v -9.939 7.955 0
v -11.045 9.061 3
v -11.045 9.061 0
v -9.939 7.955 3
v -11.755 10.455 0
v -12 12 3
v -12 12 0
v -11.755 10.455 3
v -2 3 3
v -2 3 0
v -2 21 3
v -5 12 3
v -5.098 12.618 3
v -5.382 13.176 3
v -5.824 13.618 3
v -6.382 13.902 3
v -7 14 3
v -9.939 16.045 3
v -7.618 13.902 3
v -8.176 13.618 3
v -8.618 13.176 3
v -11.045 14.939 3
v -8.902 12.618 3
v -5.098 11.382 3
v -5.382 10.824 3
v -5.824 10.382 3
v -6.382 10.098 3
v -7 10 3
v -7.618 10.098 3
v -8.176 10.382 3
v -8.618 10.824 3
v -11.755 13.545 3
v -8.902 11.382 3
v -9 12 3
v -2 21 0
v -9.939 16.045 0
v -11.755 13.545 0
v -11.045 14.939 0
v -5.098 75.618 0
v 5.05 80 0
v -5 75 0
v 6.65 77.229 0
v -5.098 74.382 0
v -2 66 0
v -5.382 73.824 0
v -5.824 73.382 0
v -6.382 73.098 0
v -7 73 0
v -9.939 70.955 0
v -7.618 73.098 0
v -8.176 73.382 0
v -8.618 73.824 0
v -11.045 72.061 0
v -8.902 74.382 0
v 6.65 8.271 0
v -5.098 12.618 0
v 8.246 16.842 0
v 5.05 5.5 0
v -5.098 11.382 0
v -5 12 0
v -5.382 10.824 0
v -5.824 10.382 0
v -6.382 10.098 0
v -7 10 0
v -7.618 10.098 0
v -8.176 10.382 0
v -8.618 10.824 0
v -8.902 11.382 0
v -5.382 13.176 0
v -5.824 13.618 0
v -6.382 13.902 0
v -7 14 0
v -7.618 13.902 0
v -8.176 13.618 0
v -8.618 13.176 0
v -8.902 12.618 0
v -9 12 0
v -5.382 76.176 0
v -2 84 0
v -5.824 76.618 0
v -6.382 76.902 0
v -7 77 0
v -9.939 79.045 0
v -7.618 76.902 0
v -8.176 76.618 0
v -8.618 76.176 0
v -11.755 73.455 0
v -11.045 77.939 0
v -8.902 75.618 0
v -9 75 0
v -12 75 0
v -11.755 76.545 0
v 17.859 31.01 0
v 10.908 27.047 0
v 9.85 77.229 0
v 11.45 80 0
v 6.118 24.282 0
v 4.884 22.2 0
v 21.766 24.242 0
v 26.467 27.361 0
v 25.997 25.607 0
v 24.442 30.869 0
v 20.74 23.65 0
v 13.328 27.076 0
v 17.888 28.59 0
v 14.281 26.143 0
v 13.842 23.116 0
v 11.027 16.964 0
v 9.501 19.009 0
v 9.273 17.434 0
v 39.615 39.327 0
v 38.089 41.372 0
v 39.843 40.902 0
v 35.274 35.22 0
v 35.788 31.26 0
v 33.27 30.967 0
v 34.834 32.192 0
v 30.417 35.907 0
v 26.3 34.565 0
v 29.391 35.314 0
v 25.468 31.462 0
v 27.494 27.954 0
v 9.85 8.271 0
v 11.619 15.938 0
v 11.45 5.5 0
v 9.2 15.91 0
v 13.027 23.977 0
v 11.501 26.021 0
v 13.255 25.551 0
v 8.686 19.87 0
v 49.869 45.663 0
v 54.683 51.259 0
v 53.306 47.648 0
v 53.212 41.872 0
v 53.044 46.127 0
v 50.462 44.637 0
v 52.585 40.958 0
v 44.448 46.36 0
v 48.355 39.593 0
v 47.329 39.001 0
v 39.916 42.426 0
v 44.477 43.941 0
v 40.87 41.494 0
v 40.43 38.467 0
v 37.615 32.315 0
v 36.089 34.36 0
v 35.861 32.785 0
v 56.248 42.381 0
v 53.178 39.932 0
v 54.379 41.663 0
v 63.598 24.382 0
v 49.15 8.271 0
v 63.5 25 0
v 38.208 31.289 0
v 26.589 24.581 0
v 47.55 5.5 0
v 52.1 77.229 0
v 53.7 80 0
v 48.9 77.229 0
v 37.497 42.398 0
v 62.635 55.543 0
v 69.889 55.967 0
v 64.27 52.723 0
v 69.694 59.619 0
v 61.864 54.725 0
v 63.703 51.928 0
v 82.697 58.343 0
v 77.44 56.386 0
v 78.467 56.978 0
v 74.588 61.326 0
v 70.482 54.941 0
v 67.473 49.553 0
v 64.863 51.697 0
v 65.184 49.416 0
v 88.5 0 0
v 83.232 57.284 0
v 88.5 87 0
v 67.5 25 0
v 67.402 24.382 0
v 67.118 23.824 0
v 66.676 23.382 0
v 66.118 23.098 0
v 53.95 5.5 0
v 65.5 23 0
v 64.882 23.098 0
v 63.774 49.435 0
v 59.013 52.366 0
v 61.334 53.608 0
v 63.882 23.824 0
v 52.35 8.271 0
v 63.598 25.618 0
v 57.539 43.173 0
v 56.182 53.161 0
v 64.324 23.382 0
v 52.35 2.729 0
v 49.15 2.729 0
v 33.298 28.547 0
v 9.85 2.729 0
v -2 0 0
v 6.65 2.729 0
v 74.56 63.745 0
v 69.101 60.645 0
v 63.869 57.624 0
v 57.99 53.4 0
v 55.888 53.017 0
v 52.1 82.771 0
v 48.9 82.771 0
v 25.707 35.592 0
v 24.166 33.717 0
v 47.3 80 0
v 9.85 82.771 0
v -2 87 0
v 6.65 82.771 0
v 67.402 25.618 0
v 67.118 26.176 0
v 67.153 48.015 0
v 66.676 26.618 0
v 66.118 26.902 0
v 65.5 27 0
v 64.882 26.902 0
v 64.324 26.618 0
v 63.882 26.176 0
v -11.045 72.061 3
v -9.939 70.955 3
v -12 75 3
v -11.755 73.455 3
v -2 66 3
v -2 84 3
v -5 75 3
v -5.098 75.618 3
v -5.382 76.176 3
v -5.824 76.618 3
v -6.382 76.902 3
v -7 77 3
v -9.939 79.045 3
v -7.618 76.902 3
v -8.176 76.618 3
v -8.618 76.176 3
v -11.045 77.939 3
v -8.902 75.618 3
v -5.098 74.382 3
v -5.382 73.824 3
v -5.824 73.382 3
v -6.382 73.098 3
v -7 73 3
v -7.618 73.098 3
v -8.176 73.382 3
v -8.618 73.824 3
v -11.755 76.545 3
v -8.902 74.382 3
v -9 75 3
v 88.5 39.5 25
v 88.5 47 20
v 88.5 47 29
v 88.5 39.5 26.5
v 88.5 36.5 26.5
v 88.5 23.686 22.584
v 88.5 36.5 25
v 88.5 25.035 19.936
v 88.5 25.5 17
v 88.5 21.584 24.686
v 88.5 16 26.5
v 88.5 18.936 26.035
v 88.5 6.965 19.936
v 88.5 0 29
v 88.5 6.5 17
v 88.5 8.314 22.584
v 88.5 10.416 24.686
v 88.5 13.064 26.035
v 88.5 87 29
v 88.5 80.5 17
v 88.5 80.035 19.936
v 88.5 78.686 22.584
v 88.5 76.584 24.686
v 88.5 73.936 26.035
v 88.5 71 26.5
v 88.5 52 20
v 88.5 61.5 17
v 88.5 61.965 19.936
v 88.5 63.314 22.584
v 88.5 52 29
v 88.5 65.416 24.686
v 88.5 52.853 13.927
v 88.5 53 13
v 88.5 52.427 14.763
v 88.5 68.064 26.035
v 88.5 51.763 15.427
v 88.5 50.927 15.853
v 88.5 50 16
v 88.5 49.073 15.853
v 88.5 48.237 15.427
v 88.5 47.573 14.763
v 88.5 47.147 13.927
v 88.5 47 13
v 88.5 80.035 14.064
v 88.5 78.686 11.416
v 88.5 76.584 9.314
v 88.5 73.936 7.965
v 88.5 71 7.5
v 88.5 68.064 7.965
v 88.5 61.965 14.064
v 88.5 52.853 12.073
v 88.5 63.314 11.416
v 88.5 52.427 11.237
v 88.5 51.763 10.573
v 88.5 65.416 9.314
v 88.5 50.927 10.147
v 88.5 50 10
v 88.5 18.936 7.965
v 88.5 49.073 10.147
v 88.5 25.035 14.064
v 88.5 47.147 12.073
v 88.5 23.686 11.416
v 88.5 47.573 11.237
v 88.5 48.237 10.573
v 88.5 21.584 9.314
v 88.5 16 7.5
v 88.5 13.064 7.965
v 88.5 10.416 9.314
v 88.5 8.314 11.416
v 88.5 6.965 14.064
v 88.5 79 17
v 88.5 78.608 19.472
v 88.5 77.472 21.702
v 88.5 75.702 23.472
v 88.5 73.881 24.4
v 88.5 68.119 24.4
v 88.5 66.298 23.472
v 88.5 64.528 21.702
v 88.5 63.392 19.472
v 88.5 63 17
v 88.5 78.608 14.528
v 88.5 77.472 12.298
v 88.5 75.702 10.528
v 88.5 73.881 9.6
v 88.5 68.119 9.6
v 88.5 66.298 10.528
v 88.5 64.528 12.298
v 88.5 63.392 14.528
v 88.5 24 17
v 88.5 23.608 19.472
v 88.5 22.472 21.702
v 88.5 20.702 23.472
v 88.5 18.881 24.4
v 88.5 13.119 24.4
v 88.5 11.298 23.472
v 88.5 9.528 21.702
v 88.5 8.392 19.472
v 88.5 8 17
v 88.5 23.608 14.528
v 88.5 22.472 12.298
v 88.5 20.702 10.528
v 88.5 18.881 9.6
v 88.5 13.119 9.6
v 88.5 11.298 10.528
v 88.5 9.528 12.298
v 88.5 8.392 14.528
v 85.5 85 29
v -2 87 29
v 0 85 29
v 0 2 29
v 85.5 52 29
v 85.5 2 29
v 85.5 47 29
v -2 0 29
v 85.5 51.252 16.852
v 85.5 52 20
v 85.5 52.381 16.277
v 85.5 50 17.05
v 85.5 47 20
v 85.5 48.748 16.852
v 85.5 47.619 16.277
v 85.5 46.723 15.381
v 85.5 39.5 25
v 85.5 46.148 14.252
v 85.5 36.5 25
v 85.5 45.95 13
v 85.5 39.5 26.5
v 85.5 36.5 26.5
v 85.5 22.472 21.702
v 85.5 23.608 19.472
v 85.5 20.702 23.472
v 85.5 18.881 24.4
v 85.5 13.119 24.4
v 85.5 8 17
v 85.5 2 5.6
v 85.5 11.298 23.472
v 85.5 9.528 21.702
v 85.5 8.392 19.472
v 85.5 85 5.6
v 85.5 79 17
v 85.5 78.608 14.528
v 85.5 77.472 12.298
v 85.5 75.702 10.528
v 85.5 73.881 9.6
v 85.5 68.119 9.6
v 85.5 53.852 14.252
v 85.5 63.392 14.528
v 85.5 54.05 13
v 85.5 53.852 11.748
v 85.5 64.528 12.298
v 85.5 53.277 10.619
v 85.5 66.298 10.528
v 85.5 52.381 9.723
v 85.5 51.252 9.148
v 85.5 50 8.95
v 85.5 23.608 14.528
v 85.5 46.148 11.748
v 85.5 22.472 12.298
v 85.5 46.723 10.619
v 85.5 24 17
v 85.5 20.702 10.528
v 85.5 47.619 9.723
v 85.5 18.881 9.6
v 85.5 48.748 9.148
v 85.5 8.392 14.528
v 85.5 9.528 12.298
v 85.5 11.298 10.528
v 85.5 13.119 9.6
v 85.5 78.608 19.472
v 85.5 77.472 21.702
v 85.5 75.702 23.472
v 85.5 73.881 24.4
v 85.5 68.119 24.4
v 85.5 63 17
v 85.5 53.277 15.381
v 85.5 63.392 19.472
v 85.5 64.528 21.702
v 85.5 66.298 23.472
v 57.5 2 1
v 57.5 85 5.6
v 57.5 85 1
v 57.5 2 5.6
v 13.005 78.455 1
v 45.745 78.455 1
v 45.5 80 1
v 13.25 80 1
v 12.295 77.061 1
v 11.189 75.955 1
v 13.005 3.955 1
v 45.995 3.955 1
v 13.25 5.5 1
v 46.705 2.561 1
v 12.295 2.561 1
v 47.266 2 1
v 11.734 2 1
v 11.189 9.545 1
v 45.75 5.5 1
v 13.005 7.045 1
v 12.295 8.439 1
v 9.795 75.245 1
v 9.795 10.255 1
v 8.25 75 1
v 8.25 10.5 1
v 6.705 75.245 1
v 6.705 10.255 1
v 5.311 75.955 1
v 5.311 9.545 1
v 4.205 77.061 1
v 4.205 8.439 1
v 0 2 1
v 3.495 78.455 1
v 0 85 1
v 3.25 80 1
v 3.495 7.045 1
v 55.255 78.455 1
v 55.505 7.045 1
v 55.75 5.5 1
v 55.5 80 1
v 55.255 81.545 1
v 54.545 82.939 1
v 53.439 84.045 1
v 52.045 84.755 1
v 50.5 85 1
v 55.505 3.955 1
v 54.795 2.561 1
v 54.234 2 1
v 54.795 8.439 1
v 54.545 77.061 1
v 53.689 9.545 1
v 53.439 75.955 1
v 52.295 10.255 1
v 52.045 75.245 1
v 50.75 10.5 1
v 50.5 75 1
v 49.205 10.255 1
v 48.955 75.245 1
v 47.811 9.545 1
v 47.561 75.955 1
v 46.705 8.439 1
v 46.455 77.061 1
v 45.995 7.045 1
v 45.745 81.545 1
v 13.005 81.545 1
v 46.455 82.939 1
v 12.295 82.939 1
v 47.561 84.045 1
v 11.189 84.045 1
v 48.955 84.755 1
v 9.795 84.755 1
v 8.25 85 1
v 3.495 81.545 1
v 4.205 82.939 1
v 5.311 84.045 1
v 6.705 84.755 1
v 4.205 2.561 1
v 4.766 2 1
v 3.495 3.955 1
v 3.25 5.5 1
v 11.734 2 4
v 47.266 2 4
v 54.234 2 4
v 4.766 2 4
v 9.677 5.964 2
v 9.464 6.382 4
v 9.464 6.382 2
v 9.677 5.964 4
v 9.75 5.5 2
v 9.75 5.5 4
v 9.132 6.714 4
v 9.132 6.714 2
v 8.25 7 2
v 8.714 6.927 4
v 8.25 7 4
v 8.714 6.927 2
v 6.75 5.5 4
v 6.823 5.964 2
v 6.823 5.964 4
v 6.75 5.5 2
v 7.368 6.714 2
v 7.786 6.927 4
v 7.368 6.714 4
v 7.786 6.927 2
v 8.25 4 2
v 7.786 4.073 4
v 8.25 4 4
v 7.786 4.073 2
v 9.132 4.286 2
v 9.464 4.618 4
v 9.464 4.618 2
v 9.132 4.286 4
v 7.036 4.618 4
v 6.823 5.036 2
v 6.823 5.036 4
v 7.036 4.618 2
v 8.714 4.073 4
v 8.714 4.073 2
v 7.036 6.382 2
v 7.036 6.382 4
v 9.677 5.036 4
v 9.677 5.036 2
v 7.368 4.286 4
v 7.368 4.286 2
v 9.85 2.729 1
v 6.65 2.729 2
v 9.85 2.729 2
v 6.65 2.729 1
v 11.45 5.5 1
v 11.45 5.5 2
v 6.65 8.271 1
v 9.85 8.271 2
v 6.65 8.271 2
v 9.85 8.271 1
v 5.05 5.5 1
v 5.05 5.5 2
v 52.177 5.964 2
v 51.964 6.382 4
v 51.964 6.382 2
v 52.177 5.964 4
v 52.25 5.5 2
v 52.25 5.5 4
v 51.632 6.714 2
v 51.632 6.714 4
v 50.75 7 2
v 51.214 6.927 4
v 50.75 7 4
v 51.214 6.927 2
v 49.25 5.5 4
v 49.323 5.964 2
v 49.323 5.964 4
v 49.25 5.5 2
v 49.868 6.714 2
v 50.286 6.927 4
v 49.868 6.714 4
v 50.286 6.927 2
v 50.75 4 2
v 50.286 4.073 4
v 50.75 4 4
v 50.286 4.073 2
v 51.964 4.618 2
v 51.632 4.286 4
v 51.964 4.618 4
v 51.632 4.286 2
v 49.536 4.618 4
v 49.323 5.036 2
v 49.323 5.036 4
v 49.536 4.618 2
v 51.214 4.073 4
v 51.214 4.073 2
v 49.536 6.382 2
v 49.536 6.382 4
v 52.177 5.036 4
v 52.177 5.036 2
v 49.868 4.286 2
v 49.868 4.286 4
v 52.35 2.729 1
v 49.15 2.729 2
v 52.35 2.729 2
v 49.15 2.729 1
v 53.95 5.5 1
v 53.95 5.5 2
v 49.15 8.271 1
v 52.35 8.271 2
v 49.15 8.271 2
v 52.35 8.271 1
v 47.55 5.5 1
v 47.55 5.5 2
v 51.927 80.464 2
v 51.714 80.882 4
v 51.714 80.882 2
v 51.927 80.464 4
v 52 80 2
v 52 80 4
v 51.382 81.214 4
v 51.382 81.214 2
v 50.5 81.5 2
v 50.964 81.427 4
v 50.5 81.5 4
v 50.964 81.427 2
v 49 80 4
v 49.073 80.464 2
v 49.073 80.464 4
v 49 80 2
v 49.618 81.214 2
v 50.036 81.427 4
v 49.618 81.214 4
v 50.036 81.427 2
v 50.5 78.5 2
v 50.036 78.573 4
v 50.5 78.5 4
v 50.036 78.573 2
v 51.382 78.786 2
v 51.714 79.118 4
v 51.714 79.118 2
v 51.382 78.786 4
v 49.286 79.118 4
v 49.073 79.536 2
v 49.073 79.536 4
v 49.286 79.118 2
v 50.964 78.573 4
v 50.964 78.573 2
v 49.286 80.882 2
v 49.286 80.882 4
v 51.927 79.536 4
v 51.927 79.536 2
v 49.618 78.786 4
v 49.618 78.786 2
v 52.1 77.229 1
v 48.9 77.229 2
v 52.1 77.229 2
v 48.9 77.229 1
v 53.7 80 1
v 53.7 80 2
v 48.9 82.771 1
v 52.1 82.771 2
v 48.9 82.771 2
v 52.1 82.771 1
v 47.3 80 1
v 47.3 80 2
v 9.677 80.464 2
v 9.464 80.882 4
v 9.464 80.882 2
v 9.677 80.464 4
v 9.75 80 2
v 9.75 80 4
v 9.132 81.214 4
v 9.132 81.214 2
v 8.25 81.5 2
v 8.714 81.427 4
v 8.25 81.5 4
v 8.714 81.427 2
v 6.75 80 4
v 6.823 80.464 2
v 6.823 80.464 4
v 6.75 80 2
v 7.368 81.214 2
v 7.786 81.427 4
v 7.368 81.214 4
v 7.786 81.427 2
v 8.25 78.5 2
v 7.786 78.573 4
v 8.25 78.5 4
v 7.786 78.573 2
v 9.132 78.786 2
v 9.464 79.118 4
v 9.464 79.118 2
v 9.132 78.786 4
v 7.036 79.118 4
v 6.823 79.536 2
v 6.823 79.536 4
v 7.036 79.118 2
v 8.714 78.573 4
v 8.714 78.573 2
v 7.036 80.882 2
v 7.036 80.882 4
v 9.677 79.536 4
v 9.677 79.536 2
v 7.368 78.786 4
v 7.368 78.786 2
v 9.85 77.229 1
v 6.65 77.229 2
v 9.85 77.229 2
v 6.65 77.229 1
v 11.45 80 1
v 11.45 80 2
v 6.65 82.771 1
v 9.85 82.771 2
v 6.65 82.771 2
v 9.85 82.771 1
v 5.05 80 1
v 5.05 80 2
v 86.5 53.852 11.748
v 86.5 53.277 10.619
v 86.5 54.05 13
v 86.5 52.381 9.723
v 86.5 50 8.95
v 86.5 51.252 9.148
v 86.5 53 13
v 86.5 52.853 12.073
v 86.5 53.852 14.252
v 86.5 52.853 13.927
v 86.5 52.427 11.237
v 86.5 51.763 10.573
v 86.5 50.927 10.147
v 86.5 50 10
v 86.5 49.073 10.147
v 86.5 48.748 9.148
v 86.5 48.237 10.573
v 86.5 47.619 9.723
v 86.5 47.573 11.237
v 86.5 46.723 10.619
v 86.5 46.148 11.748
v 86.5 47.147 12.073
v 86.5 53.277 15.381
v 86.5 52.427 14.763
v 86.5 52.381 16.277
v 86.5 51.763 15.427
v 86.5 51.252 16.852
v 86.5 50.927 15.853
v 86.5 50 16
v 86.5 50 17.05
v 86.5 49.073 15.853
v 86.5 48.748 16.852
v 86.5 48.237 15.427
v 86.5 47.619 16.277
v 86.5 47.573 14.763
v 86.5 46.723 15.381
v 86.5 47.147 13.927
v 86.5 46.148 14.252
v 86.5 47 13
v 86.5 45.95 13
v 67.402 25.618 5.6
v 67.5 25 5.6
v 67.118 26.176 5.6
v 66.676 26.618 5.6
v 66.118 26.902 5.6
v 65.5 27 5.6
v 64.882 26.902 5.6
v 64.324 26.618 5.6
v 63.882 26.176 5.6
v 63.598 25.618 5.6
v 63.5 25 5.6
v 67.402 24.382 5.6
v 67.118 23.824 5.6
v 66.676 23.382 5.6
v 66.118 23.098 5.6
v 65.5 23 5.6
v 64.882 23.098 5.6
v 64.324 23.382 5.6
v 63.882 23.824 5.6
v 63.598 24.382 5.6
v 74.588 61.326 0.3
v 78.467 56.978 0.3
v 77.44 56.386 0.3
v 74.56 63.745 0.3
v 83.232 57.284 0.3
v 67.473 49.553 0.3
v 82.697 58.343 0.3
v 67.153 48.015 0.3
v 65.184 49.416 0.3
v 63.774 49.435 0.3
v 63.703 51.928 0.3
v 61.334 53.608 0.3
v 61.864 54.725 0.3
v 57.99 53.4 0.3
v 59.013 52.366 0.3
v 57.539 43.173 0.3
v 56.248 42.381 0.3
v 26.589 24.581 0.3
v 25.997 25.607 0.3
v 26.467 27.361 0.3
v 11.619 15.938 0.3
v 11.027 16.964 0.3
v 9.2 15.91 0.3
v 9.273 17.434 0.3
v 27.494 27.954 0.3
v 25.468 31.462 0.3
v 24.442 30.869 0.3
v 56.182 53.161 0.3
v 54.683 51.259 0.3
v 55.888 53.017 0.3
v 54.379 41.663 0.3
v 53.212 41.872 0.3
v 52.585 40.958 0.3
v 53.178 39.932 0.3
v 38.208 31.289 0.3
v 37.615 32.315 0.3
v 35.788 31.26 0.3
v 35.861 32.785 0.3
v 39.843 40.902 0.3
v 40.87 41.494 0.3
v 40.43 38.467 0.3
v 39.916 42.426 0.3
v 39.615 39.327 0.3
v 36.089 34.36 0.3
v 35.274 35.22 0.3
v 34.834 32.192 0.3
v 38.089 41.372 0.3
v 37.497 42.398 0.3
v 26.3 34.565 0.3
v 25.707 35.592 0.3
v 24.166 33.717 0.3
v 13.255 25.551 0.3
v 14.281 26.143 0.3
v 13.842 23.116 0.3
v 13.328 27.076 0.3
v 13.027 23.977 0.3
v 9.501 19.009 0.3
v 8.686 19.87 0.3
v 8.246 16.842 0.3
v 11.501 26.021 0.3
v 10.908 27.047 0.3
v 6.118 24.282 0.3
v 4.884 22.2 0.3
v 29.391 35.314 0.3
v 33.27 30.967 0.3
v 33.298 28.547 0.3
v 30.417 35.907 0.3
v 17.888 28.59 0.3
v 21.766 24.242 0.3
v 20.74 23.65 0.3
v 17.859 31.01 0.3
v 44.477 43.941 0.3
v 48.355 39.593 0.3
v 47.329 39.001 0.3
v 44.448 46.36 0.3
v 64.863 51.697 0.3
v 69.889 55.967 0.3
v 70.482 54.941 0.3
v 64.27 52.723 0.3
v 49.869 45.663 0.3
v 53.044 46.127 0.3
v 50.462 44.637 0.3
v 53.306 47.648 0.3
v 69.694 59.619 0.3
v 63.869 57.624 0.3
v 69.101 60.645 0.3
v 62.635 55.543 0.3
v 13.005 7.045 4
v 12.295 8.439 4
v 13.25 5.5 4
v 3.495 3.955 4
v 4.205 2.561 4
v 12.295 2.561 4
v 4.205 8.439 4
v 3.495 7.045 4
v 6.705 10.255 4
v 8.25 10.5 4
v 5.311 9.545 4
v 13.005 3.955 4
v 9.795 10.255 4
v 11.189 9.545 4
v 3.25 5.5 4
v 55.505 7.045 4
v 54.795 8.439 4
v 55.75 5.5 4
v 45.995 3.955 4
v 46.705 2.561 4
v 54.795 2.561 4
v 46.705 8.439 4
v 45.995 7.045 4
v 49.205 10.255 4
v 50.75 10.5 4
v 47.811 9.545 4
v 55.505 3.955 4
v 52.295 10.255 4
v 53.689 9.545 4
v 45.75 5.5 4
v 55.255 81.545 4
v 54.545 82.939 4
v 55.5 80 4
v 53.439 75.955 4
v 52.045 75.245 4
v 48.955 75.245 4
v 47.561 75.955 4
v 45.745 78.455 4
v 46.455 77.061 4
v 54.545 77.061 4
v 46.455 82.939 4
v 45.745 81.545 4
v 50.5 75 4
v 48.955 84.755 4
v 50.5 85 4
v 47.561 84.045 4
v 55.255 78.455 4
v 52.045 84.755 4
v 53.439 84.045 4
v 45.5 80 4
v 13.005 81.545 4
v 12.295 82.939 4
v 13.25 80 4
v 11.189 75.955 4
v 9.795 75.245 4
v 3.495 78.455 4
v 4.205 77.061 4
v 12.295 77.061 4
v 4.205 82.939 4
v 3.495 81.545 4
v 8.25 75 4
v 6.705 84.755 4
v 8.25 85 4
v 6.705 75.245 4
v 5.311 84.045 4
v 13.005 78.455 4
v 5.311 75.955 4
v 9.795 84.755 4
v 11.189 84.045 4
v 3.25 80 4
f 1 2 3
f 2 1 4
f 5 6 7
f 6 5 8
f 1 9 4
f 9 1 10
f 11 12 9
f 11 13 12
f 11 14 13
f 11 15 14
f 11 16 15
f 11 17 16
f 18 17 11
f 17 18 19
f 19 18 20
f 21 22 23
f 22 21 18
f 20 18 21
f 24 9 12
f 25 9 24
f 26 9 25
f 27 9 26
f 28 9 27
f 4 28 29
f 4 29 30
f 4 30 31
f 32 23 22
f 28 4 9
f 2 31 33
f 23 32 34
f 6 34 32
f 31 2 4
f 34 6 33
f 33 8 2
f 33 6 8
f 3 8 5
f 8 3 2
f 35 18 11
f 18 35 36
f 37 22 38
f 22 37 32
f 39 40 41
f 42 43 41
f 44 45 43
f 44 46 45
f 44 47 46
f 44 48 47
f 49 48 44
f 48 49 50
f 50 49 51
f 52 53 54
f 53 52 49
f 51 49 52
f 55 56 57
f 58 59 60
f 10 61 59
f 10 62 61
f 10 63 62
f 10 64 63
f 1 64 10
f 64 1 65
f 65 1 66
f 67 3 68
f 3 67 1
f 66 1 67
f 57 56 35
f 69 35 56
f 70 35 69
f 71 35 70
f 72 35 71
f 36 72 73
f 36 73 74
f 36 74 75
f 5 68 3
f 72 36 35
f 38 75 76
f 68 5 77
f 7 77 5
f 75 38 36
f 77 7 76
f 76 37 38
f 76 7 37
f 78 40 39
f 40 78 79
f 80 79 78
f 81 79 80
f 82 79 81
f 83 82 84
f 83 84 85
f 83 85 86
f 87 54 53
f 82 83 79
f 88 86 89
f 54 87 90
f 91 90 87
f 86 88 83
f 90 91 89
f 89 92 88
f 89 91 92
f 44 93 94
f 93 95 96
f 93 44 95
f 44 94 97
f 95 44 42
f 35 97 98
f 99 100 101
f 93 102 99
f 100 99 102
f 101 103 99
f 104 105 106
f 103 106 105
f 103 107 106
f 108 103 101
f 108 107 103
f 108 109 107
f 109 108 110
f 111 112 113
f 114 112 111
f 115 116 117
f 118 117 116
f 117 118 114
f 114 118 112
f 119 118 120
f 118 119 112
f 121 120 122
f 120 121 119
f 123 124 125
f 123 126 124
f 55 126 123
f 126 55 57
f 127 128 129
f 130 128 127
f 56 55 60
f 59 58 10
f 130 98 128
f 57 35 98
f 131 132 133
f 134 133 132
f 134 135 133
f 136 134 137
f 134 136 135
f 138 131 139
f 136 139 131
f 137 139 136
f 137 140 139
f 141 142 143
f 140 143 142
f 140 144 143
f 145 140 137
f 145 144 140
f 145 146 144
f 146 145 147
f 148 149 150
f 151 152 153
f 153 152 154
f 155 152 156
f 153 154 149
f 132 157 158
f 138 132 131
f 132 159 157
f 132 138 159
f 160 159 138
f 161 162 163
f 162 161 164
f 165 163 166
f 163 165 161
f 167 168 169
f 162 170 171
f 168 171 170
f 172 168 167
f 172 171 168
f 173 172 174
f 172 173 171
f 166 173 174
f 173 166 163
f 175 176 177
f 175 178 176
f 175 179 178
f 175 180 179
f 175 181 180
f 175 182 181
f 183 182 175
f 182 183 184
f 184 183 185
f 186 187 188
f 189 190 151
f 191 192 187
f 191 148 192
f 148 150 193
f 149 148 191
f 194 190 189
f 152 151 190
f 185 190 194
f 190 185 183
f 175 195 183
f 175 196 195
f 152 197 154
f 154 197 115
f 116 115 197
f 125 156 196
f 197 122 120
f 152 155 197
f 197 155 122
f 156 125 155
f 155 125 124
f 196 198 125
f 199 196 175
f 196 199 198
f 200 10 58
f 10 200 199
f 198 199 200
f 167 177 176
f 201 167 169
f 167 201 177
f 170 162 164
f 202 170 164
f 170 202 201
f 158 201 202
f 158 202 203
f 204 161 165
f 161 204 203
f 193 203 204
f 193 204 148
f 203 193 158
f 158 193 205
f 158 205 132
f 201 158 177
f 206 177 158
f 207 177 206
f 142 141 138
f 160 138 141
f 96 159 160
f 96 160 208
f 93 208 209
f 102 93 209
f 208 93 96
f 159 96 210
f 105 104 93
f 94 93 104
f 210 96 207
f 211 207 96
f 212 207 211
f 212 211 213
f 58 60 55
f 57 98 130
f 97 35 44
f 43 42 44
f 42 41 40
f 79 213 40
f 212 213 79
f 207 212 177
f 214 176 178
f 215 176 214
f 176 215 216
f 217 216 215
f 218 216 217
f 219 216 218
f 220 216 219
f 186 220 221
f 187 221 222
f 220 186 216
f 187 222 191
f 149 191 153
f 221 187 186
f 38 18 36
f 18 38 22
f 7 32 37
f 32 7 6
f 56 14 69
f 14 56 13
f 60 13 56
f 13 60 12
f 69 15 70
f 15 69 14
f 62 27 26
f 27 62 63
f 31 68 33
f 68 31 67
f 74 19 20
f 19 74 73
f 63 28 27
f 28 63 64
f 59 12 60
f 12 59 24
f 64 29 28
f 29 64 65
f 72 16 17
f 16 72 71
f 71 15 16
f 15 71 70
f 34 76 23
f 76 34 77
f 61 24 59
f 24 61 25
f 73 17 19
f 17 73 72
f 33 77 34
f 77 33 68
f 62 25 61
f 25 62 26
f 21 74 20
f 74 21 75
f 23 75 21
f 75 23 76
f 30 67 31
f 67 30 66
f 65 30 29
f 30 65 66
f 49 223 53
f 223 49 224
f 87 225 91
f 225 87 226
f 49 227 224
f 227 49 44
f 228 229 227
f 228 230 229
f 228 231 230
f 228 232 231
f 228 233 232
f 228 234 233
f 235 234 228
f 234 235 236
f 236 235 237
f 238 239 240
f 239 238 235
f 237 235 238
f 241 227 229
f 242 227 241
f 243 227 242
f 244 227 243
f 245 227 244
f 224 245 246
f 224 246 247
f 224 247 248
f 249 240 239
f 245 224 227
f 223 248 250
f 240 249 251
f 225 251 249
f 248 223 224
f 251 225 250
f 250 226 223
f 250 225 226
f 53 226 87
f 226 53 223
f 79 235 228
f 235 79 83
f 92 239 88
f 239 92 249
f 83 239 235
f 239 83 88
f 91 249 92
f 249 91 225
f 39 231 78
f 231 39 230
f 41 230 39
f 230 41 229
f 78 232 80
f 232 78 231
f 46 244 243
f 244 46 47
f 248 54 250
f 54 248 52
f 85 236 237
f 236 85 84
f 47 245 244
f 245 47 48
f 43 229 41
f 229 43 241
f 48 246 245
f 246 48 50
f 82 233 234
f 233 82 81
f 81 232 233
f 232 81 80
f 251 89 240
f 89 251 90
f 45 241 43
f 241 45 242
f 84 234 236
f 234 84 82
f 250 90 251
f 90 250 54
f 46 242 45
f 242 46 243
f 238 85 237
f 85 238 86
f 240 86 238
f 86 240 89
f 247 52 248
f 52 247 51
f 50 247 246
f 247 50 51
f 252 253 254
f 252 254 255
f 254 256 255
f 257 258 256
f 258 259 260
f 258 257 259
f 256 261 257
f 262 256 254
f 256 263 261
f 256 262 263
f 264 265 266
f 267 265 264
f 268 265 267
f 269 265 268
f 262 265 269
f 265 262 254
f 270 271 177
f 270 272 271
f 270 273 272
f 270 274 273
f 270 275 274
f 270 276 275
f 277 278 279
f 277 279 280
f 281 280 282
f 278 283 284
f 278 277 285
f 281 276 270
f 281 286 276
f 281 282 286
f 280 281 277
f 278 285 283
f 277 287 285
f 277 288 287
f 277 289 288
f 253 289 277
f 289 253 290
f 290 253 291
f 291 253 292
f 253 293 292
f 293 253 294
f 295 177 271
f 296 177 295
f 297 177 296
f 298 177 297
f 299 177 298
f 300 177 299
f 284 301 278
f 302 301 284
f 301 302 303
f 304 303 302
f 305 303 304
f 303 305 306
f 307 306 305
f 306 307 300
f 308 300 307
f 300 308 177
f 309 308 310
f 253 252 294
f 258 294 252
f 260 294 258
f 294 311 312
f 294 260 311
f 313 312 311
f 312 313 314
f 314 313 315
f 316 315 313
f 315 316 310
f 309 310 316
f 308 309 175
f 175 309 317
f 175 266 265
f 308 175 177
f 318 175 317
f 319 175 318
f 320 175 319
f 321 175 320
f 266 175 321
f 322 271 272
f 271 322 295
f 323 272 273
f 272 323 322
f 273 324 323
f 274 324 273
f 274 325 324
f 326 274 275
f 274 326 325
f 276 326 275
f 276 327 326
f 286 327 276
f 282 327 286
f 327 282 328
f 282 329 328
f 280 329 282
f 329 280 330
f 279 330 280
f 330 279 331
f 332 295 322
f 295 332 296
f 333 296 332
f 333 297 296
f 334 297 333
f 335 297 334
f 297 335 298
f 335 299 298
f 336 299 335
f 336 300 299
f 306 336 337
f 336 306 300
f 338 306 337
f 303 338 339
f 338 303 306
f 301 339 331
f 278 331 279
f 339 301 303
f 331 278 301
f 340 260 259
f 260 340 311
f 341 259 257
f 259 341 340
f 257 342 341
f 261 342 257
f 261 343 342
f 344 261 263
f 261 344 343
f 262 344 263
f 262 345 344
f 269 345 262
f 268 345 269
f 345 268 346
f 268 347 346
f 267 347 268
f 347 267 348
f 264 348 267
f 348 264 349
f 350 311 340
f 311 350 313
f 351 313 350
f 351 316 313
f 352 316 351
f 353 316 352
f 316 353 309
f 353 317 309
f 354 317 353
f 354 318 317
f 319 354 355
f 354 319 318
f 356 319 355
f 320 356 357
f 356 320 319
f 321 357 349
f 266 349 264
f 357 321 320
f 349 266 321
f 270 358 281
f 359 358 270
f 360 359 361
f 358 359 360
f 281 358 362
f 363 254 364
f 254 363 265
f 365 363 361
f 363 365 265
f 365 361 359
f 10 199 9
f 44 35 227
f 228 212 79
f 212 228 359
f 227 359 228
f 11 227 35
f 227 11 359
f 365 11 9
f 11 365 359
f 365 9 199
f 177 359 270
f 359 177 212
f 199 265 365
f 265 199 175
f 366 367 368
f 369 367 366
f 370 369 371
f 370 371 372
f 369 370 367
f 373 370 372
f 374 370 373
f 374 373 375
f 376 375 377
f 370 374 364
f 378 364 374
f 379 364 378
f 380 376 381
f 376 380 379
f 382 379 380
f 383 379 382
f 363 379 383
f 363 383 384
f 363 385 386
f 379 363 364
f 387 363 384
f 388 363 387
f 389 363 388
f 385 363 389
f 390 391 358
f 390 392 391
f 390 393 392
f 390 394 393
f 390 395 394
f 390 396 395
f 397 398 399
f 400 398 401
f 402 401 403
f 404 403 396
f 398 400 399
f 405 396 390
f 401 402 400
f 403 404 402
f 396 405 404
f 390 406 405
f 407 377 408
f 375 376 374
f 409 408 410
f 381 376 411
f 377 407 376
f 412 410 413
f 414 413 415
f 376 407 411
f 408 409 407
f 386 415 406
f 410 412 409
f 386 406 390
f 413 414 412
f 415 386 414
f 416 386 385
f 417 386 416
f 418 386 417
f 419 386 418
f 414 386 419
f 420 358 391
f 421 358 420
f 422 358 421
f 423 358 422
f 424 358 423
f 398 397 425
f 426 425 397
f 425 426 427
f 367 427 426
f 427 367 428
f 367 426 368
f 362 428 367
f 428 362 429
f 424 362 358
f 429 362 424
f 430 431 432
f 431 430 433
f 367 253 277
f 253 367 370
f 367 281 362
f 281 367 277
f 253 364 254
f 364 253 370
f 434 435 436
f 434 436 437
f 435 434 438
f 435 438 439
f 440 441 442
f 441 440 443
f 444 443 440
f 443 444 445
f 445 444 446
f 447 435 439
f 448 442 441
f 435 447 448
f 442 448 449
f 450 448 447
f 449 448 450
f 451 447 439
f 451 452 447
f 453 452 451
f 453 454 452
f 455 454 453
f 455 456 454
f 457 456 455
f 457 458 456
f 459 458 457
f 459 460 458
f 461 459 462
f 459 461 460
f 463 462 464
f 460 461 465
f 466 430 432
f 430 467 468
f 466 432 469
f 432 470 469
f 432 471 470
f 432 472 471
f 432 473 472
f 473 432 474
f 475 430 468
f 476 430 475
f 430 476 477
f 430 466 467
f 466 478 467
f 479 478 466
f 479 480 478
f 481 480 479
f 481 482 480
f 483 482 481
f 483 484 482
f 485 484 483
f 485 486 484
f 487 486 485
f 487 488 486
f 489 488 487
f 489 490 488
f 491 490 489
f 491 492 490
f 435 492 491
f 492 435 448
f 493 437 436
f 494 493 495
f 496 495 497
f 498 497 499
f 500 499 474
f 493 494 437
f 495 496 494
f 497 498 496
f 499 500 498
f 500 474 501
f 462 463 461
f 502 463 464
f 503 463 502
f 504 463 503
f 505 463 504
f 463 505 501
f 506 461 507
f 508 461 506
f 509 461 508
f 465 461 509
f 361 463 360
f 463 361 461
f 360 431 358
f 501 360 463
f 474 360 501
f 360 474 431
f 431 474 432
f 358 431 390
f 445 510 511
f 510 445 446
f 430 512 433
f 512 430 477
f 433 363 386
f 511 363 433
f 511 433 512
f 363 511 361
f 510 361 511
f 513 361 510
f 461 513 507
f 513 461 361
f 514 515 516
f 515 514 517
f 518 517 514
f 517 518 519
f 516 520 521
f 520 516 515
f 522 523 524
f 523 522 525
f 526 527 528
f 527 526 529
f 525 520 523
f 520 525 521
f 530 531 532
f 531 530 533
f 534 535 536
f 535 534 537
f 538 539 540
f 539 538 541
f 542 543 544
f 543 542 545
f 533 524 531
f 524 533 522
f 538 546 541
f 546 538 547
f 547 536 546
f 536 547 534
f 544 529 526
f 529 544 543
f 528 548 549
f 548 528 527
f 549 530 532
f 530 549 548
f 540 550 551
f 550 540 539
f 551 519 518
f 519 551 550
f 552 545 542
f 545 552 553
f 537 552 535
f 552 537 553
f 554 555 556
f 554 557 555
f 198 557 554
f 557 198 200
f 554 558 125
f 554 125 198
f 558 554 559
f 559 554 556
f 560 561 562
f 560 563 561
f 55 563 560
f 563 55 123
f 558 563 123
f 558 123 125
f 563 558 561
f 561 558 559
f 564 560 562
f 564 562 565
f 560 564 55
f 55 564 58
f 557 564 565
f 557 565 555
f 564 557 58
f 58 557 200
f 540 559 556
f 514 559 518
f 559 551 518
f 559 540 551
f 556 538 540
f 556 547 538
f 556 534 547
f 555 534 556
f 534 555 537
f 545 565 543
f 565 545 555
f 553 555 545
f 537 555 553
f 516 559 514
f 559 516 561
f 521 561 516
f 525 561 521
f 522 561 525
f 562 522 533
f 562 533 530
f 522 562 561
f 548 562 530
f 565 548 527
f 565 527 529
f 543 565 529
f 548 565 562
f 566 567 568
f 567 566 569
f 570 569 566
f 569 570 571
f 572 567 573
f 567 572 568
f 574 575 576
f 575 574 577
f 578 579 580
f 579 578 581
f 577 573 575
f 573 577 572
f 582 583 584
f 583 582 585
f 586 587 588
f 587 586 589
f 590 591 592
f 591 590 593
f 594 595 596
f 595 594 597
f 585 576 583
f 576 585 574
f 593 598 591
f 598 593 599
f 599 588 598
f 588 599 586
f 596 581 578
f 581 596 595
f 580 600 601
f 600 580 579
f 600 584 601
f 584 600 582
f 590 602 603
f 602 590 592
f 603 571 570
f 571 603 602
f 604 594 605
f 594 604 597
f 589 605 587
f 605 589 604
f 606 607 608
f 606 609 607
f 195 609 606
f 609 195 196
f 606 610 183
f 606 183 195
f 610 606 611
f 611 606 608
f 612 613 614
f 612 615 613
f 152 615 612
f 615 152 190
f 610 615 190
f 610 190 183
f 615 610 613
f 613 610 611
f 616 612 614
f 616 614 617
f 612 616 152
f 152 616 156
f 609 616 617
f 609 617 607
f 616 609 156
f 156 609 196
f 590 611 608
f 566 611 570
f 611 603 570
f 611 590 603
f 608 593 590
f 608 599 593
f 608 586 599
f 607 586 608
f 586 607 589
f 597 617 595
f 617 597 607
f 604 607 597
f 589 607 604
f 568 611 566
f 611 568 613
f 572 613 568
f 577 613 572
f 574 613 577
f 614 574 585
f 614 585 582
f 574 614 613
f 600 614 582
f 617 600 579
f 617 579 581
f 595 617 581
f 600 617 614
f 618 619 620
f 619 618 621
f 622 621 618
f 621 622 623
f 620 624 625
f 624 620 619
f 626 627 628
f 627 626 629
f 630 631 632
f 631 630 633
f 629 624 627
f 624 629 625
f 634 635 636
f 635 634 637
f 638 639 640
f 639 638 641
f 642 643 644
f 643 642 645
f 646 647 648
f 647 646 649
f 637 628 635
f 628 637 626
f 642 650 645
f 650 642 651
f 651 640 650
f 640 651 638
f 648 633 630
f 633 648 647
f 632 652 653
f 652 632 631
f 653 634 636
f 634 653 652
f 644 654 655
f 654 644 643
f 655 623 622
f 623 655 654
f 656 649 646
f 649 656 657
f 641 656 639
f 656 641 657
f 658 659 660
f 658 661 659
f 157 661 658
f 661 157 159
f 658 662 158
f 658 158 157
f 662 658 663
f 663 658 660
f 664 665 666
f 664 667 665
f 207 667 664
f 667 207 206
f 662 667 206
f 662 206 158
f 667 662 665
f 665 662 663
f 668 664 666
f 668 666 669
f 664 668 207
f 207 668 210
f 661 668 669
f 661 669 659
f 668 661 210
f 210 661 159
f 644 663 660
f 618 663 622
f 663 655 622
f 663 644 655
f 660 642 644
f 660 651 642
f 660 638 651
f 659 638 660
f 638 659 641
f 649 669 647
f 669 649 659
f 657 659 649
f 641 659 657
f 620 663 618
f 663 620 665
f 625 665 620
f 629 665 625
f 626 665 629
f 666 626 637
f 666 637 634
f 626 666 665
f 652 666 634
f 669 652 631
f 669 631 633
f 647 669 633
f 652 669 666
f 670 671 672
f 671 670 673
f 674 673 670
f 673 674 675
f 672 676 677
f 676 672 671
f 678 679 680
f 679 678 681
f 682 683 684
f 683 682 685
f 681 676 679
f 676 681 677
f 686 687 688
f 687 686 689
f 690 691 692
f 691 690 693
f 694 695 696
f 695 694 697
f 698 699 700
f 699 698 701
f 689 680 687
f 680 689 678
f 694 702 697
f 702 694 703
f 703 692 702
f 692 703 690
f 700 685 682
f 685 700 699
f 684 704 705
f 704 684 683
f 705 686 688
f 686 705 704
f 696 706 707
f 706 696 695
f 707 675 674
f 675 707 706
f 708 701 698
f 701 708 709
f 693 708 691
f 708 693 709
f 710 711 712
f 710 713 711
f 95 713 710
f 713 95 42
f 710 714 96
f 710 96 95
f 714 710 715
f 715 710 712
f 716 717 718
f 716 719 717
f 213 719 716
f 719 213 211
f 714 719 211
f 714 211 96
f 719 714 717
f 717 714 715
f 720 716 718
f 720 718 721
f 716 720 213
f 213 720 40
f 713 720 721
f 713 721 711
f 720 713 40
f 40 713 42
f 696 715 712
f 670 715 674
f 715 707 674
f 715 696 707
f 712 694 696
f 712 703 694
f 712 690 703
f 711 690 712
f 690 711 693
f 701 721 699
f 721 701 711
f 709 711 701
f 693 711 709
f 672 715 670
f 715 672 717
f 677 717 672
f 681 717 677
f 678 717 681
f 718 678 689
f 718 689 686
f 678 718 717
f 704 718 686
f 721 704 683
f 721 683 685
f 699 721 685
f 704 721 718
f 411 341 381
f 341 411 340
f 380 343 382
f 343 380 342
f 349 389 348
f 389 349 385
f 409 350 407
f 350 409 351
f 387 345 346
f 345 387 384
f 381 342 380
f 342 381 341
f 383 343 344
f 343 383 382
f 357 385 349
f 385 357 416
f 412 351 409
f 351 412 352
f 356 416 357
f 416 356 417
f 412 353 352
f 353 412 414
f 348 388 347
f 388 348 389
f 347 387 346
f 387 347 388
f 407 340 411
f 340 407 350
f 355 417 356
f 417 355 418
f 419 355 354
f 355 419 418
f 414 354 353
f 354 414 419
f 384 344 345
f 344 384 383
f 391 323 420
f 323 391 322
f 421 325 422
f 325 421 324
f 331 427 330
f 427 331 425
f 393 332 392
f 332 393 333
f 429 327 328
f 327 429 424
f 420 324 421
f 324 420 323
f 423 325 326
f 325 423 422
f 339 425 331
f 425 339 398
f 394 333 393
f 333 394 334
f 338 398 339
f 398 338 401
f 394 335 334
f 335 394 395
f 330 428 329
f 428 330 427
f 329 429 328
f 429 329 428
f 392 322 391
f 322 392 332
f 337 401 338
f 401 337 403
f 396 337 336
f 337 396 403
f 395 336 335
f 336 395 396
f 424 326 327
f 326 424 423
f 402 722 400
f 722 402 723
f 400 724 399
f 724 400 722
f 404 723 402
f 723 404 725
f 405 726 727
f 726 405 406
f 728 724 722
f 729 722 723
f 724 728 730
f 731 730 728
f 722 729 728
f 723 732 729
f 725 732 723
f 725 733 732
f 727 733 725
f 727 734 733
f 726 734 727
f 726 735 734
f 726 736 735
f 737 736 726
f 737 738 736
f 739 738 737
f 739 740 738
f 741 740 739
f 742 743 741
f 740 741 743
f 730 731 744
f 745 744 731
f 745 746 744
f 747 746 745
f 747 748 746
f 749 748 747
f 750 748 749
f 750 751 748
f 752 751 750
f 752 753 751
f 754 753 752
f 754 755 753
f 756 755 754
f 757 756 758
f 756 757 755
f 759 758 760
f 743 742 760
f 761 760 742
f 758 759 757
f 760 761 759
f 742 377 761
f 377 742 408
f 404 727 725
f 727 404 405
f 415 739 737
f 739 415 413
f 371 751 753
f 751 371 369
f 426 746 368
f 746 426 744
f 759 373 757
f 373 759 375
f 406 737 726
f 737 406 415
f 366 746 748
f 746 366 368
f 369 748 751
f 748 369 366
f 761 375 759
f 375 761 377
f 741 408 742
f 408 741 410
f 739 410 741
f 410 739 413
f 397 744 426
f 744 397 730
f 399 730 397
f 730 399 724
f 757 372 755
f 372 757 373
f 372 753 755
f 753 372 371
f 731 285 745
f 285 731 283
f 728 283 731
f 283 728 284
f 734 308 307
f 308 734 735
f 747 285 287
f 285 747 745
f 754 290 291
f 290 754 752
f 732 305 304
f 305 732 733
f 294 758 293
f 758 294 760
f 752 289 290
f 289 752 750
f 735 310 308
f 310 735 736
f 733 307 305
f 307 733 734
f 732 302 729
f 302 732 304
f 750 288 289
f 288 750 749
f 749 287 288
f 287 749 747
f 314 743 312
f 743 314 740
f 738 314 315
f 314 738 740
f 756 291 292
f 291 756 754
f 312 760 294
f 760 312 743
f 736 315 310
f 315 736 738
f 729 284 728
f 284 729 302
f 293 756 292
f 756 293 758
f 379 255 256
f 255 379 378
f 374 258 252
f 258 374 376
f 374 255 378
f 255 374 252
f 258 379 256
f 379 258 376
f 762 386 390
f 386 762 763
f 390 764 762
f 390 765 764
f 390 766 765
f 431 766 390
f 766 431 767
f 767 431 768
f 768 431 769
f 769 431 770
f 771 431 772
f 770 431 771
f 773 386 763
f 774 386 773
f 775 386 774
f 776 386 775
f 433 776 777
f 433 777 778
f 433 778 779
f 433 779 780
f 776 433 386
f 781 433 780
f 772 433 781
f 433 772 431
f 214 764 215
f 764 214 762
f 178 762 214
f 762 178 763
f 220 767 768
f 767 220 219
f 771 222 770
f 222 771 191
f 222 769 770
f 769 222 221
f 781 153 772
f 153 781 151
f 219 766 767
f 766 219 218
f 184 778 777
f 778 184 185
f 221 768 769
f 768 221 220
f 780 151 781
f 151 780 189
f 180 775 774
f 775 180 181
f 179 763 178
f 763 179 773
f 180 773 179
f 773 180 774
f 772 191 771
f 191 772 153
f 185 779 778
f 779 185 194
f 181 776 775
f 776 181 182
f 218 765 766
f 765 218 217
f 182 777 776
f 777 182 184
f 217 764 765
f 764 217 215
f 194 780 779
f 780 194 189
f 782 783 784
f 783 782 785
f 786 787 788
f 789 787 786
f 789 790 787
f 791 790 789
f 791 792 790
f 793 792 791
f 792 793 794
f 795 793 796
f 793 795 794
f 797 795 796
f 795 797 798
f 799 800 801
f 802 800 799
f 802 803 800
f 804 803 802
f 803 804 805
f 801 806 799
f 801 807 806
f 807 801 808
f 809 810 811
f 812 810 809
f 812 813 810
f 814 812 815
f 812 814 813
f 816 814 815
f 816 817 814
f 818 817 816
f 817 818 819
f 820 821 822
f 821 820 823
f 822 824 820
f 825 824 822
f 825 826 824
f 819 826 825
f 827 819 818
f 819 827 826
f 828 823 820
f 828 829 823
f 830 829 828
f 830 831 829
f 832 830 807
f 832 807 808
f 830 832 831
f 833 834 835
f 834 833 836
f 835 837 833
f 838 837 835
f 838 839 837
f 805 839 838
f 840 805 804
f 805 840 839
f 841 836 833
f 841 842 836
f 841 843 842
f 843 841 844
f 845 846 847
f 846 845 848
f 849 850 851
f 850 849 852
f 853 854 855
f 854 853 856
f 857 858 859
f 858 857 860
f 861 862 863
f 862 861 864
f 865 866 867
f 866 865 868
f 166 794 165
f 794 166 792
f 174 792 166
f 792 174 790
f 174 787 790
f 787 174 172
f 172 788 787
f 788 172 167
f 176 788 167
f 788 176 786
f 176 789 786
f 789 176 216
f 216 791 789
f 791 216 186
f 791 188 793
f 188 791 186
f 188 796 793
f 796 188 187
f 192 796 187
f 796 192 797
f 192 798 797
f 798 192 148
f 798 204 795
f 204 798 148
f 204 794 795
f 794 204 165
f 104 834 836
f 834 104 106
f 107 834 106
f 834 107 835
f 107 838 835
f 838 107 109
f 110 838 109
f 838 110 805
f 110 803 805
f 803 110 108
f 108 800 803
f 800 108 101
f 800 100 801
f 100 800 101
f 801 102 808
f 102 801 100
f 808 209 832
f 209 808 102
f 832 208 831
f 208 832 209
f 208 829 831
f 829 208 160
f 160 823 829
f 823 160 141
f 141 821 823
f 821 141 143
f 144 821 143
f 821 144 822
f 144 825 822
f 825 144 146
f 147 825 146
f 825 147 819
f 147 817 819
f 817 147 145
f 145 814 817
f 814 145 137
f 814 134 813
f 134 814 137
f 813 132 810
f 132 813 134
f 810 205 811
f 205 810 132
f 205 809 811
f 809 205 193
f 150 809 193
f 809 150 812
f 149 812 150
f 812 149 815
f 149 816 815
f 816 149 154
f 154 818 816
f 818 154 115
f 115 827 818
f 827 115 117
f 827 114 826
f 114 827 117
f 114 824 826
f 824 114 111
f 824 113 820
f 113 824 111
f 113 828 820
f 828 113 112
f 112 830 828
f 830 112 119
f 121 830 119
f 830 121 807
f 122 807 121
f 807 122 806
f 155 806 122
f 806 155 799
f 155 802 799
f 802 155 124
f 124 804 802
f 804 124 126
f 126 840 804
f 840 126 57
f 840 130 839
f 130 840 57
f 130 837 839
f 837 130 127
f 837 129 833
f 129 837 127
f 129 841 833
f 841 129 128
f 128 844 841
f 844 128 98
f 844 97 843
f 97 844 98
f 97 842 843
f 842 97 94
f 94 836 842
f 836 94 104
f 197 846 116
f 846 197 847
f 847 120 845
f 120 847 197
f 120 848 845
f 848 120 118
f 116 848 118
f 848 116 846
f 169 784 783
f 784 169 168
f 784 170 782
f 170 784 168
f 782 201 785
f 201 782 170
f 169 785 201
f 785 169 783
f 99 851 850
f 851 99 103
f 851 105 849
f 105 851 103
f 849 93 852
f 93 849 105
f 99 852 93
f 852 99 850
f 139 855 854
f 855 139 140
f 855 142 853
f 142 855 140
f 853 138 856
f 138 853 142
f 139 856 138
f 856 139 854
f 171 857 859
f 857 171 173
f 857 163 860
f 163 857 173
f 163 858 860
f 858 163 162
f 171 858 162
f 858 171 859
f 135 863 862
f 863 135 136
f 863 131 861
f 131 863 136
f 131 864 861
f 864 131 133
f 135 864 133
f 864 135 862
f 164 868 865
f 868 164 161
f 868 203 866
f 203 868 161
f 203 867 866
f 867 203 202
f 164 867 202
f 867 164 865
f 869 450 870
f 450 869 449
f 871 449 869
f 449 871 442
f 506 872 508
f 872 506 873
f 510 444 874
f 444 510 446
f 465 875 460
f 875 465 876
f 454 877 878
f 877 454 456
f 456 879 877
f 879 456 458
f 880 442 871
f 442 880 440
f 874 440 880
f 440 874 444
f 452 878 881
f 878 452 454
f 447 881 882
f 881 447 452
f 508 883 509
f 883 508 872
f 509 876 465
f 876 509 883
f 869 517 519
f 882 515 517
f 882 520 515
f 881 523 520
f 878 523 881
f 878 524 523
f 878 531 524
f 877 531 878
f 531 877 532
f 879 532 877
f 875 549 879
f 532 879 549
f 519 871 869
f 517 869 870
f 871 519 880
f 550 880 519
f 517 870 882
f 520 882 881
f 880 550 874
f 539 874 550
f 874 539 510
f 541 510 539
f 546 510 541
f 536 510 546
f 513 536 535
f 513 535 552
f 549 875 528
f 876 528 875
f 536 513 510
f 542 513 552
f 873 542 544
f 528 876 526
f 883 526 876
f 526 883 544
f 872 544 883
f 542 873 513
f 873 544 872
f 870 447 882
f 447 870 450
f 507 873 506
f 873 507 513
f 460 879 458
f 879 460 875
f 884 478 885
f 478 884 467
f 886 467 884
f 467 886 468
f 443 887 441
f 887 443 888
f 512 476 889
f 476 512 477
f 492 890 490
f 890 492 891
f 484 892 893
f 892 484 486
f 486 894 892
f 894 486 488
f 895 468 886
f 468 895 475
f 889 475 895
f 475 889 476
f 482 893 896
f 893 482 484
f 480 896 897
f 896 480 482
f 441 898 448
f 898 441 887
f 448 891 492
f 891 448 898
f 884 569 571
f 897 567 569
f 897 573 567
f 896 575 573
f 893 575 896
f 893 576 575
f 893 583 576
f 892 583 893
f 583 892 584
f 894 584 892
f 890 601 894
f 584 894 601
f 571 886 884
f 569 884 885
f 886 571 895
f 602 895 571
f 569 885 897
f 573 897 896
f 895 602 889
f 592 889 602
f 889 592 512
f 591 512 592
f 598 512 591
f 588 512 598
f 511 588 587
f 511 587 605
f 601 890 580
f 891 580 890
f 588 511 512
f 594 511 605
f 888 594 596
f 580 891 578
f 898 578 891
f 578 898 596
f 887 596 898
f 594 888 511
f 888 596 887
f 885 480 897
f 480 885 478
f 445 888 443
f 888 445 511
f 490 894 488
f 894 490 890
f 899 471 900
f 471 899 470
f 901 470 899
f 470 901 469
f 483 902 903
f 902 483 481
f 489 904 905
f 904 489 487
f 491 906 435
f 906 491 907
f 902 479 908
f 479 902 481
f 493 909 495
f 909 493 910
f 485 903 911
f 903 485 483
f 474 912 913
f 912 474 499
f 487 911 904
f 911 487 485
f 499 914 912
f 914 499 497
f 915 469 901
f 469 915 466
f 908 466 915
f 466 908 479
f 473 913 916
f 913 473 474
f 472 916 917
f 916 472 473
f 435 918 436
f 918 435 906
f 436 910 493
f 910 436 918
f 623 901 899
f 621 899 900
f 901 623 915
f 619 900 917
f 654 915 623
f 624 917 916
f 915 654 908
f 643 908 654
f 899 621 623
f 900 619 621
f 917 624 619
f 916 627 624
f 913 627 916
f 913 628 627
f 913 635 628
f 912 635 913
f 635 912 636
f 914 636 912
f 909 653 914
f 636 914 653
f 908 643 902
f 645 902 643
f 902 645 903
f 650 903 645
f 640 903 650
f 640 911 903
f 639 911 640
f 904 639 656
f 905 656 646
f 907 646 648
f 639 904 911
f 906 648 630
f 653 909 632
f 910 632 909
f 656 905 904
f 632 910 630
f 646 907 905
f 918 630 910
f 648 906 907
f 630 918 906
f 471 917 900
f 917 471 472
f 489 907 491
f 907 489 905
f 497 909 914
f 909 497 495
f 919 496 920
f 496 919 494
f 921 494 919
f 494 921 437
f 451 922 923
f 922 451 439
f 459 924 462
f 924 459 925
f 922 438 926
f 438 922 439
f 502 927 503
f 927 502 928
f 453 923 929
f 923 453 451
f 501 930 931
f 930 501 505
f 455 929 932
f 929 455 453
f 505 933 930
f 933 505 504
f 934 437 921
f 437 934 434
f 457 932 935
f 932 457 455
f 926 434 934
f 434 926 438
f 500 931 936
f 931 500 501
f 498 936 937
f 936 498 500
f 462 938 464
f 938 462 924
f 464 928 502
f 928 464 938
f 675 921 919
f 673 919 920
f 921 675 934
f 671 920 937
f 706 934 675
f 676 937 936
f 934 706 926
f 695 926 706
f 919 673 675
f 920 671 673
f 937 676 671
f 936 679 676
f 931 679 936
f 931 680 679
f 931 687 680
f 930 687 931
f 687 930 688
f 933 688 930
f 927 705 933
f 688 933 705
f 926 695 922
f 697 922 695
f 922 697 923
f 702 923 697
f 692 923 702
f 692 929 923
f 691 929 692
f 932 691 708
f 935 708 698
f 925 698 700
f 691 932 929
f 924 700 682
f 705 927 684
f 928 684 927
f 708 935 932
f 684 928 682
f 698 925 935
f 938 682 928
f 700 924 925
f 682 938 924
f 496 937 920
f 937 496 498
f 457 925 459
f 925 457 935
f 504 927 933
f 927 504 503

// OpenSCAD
$fn = 20 + 0;

standheight = 3;

// Measurements of the pcb (including mounts)
pcbsize = [57.5, 83, 25 + standheight];

// frontyard size
frontyard_height = 1.6 + standheight;
frontyard = [28, pcbsize[1], pcbsize[2] - frontyard_height];

hole_positions = [[8.25, 3.5],
                  [50.75, 3.5],
                  [50.5, 78],
                  [8.25, 78] 
];

// Wall thickness of the inner part
bottom_backwall = 1;
bottom_outerwall = 2;
bottom_frontwall = 3;

top_heightcorrection = 0.9;
top_outerwall = 3;

wall_hole_positions = [
    [ pcbsize[0] + 8, 25, 0 ],
   [ -7, 10 + bottom_outerwall, 0],
   [ -7, -10 + pcbsize[1] + bottom_outerwall, 0]];

module stustanet_logo(height) {
    linear_extrude(height = height, convexity=100)
        import (file = "logo.dxf");
    
}

module pcb(bottom_height) {
    cube(pcbsize);
    
    // the antenna
    translate([pcbsize[0], 35.5, 6 + standheight])
    rotate([0, 90, 0])
    cylinder(h=27, d=6);
    
    // the usb plug
    translate([pcbsize[0], 44, 14 + standheight]) {
        cube([28, 12, 6]);
        // the cable
        
        translate([23, 1, 2])
        cube([15, 5, 3 + bottom_height * 1000]);
    }
}

// The origin of the sensor is the inside of the mount, -x is the direction of the connector
module sensorplug() {
    rotate([0,0,90]) {
        // The inner with the flat areas
        difference() {
            translate([0, 9, 0])
            rotate([90, 0, 0])
            cylinder(r=8, h=16.5);
            
            translate([0, 0, -8])
            cube([10, 20, 1.2], center=true);
            translate([0, 0, 8])
            cube([10, 20, 1.2], center=true);
        }
        // The Ring
        translate([])
        rotate([90, 0, 0])
        cylinder(d=19, h=2);
        
        // the plug connectors
        translate([0, 19, 0])
        rotate([90, 0, 0])
        cylinder(d=10, h=10);
    }
}

// here also -y is the direction where the plug comes in
// Beware - the audio plug needs min. 2mm of the frontal mount = the wall at the audio plug must be max. 2mm!
module audioplug() {
    rotate([0, 0, 90]) {
        // Base
        rotate([-90, 0, 0])
        cylinder(h=20, d=8.1);

        // Screwing part
        translate([])
        rotate([90, 0, 0])
        cylinder(h=4.5, d=6);
    }
}

module make_pcb_pin(pos) {
    translate(pos)
    translate([0, bottom_outerwall, bottom_backwall])
    cylinder(r=5, h=standheight);
}

module make_pcb_pin_hole(pos) {
    translate(pos)
    translate([0, bottom_outerwall, 0]) {
        // M3 screw
        cylinder(d=3, h=10);
        // M3 screwhead
        cylinder(d=6.4, h = 2, $fn=6);
    }
}

module wall_mount_hole(pos) {
    translate(pos) {
        cylinder(h=bottom_backwall + 100, d = 4);
    }
}

module wall_mount(pos) {
    height = 3;
    difference() {
        translate(pos) {
            hull() {
                cylinder(h=height, d = 10);
                translate([15, 0, height/2])
                cube([20, 18, height], center=true);
            }
        }
        wall_mount_hole(pos);
    }
}


module bottom() {
    difference() {
        union () {
            translate([-bottom_outerwall, 0, 0])
            cube([pcbsize[0] + frontyard[0] + bottom_frontwall + bottom_outerwall, 
                pcbsize[1] + bottom_outerwall * 2,
                pcbsize[2] + bottom_backwall
            ]);
            wall_mount(wall_hole_positions[1]);
            wall_mount(wall_hole_positions[2]);
        }
        
        // Frontyard
        translate([pcbsize[0],
            bottom_outerwall,
            bottom_backwall + frontyard_height])
        cube(frontyard);
        
        translate([0, bottom_outerwall, bottom_backwall])
        pcb(1);

        for (i = hole_positions) {
            make_pcb_pin_hole(i);
        }
        
        wall_mount_hole(wall_hole_positions[0]);

        translate([pcbsize[0] + frontyard[0] + bottom_frontwall, 0, 0]) {
            translate([0, 14 + bottom_outerwall, 17])
            sensorplug();
            
            translate([0, pcbsize[1] - 14 + bottom_outerwall, 17])
            sensorplug();
            
            translate([-2, pcbsize[1]/2 + 8.5, 13])
            audioplug();
        
            cablebinder_width = 3;
            cablebinder_height = 1.5;
            // Cablebinder holder hole
            translate([-5, pcbsize[1]/2 - 5, 25])
            cube([10, cablebinder_width, cablebinder_height]);
        }

        
        ssnscale = 0.35;
        translate([0, 25, 0.3])
        rotate([180, 0, 30])
        scale([ssnscale, ssnscale, 1])
        stustanet_logo(0.3);
        
    }
    for (i = hole_positions) {
        difference() {
            make_pcb_pin(i);
            make_pcb_pin_hole(i);
        }
    }
}

module top() {
    hook_size = 3;
    
    difference() {
        translate([-top_outerwall - bottom_outerwall, -top_outerwall, -top_outerwall - 0.2])
        cube([pcbsize[0] + frontyard[0] + bottom_frontwall + bottom_outerwall + top_outerwall * 1, 
            pcbsize[1] + bottom_outerwall * 2 + top_outerwall * 2,
            pcbsize[2] + bottom_backwall + top_outerwall * 2 + top_heightcorrection
        ]);

        translate([hook_size, hook_size, -5])
        cube([pcbsize[0] + frontyard[0] + bottom_frontwall + bottom_outerwall + top_outerwall * 1 - hook_size * 2, 
            pcbsize[1] + bottom_outerwall * 2 - hook_size * 2,
            10
        ]);

        ssnscale = 0.15;
        translate([85,
            7,
            pcbsize[2] + bottom_backwall + top_outerwall + top_heightcorrection - 0.5])
        rotate([0, 0, 180])
        scale([ssnscale, ssnscale, 1])
        stustanet_logo(0.5);
        
        translate([-bottom_outerwall, 0, 0])
        cube([pcbsize[0] + frontyard[0] + bottom_frontwall + bottom_outerwall, 
            pcbsize[1] + bottom_outerwall * 2,
            pcbsize[2] + bottom_backwall + + top_heightcorrection
        ]);
        scale([1,1,3])
        translate([0,0,-1.5])
        wall_mount(wall_hole_positions[1]);

        scale([1,1,3])
        translate([0,0,-1.5])
        wall_mount(wall_hole_positions[2]);
    
        cablebinder_width = 3;
        cablebinder_height = 1.5;
        // Cablebinder holder hole
        translate([
            pcbsize[0] + frontyard[0] - 3,
            pcbsize[1]/2 - 5, 
            pcbsize[2]])
        cube([cablebinder_height, cablebinder_width, 10]);

    
    }
    
    // The nose
    translate([0,          bottom_outerwall, bottom_backwall] 
            + [pcbsize[0], 44,               14 + standheight]
            + [23,         1,                2] 
            + [6,          0,                3 + top_heightcorrection])
    cube([bottom_outerwall, 5, 3 + 3]);
}

//translate([0, bottom_outerwall, bottom_backwall])
//#pcb();
//sensorplug();
//audioplug();

//top();
bottom();
